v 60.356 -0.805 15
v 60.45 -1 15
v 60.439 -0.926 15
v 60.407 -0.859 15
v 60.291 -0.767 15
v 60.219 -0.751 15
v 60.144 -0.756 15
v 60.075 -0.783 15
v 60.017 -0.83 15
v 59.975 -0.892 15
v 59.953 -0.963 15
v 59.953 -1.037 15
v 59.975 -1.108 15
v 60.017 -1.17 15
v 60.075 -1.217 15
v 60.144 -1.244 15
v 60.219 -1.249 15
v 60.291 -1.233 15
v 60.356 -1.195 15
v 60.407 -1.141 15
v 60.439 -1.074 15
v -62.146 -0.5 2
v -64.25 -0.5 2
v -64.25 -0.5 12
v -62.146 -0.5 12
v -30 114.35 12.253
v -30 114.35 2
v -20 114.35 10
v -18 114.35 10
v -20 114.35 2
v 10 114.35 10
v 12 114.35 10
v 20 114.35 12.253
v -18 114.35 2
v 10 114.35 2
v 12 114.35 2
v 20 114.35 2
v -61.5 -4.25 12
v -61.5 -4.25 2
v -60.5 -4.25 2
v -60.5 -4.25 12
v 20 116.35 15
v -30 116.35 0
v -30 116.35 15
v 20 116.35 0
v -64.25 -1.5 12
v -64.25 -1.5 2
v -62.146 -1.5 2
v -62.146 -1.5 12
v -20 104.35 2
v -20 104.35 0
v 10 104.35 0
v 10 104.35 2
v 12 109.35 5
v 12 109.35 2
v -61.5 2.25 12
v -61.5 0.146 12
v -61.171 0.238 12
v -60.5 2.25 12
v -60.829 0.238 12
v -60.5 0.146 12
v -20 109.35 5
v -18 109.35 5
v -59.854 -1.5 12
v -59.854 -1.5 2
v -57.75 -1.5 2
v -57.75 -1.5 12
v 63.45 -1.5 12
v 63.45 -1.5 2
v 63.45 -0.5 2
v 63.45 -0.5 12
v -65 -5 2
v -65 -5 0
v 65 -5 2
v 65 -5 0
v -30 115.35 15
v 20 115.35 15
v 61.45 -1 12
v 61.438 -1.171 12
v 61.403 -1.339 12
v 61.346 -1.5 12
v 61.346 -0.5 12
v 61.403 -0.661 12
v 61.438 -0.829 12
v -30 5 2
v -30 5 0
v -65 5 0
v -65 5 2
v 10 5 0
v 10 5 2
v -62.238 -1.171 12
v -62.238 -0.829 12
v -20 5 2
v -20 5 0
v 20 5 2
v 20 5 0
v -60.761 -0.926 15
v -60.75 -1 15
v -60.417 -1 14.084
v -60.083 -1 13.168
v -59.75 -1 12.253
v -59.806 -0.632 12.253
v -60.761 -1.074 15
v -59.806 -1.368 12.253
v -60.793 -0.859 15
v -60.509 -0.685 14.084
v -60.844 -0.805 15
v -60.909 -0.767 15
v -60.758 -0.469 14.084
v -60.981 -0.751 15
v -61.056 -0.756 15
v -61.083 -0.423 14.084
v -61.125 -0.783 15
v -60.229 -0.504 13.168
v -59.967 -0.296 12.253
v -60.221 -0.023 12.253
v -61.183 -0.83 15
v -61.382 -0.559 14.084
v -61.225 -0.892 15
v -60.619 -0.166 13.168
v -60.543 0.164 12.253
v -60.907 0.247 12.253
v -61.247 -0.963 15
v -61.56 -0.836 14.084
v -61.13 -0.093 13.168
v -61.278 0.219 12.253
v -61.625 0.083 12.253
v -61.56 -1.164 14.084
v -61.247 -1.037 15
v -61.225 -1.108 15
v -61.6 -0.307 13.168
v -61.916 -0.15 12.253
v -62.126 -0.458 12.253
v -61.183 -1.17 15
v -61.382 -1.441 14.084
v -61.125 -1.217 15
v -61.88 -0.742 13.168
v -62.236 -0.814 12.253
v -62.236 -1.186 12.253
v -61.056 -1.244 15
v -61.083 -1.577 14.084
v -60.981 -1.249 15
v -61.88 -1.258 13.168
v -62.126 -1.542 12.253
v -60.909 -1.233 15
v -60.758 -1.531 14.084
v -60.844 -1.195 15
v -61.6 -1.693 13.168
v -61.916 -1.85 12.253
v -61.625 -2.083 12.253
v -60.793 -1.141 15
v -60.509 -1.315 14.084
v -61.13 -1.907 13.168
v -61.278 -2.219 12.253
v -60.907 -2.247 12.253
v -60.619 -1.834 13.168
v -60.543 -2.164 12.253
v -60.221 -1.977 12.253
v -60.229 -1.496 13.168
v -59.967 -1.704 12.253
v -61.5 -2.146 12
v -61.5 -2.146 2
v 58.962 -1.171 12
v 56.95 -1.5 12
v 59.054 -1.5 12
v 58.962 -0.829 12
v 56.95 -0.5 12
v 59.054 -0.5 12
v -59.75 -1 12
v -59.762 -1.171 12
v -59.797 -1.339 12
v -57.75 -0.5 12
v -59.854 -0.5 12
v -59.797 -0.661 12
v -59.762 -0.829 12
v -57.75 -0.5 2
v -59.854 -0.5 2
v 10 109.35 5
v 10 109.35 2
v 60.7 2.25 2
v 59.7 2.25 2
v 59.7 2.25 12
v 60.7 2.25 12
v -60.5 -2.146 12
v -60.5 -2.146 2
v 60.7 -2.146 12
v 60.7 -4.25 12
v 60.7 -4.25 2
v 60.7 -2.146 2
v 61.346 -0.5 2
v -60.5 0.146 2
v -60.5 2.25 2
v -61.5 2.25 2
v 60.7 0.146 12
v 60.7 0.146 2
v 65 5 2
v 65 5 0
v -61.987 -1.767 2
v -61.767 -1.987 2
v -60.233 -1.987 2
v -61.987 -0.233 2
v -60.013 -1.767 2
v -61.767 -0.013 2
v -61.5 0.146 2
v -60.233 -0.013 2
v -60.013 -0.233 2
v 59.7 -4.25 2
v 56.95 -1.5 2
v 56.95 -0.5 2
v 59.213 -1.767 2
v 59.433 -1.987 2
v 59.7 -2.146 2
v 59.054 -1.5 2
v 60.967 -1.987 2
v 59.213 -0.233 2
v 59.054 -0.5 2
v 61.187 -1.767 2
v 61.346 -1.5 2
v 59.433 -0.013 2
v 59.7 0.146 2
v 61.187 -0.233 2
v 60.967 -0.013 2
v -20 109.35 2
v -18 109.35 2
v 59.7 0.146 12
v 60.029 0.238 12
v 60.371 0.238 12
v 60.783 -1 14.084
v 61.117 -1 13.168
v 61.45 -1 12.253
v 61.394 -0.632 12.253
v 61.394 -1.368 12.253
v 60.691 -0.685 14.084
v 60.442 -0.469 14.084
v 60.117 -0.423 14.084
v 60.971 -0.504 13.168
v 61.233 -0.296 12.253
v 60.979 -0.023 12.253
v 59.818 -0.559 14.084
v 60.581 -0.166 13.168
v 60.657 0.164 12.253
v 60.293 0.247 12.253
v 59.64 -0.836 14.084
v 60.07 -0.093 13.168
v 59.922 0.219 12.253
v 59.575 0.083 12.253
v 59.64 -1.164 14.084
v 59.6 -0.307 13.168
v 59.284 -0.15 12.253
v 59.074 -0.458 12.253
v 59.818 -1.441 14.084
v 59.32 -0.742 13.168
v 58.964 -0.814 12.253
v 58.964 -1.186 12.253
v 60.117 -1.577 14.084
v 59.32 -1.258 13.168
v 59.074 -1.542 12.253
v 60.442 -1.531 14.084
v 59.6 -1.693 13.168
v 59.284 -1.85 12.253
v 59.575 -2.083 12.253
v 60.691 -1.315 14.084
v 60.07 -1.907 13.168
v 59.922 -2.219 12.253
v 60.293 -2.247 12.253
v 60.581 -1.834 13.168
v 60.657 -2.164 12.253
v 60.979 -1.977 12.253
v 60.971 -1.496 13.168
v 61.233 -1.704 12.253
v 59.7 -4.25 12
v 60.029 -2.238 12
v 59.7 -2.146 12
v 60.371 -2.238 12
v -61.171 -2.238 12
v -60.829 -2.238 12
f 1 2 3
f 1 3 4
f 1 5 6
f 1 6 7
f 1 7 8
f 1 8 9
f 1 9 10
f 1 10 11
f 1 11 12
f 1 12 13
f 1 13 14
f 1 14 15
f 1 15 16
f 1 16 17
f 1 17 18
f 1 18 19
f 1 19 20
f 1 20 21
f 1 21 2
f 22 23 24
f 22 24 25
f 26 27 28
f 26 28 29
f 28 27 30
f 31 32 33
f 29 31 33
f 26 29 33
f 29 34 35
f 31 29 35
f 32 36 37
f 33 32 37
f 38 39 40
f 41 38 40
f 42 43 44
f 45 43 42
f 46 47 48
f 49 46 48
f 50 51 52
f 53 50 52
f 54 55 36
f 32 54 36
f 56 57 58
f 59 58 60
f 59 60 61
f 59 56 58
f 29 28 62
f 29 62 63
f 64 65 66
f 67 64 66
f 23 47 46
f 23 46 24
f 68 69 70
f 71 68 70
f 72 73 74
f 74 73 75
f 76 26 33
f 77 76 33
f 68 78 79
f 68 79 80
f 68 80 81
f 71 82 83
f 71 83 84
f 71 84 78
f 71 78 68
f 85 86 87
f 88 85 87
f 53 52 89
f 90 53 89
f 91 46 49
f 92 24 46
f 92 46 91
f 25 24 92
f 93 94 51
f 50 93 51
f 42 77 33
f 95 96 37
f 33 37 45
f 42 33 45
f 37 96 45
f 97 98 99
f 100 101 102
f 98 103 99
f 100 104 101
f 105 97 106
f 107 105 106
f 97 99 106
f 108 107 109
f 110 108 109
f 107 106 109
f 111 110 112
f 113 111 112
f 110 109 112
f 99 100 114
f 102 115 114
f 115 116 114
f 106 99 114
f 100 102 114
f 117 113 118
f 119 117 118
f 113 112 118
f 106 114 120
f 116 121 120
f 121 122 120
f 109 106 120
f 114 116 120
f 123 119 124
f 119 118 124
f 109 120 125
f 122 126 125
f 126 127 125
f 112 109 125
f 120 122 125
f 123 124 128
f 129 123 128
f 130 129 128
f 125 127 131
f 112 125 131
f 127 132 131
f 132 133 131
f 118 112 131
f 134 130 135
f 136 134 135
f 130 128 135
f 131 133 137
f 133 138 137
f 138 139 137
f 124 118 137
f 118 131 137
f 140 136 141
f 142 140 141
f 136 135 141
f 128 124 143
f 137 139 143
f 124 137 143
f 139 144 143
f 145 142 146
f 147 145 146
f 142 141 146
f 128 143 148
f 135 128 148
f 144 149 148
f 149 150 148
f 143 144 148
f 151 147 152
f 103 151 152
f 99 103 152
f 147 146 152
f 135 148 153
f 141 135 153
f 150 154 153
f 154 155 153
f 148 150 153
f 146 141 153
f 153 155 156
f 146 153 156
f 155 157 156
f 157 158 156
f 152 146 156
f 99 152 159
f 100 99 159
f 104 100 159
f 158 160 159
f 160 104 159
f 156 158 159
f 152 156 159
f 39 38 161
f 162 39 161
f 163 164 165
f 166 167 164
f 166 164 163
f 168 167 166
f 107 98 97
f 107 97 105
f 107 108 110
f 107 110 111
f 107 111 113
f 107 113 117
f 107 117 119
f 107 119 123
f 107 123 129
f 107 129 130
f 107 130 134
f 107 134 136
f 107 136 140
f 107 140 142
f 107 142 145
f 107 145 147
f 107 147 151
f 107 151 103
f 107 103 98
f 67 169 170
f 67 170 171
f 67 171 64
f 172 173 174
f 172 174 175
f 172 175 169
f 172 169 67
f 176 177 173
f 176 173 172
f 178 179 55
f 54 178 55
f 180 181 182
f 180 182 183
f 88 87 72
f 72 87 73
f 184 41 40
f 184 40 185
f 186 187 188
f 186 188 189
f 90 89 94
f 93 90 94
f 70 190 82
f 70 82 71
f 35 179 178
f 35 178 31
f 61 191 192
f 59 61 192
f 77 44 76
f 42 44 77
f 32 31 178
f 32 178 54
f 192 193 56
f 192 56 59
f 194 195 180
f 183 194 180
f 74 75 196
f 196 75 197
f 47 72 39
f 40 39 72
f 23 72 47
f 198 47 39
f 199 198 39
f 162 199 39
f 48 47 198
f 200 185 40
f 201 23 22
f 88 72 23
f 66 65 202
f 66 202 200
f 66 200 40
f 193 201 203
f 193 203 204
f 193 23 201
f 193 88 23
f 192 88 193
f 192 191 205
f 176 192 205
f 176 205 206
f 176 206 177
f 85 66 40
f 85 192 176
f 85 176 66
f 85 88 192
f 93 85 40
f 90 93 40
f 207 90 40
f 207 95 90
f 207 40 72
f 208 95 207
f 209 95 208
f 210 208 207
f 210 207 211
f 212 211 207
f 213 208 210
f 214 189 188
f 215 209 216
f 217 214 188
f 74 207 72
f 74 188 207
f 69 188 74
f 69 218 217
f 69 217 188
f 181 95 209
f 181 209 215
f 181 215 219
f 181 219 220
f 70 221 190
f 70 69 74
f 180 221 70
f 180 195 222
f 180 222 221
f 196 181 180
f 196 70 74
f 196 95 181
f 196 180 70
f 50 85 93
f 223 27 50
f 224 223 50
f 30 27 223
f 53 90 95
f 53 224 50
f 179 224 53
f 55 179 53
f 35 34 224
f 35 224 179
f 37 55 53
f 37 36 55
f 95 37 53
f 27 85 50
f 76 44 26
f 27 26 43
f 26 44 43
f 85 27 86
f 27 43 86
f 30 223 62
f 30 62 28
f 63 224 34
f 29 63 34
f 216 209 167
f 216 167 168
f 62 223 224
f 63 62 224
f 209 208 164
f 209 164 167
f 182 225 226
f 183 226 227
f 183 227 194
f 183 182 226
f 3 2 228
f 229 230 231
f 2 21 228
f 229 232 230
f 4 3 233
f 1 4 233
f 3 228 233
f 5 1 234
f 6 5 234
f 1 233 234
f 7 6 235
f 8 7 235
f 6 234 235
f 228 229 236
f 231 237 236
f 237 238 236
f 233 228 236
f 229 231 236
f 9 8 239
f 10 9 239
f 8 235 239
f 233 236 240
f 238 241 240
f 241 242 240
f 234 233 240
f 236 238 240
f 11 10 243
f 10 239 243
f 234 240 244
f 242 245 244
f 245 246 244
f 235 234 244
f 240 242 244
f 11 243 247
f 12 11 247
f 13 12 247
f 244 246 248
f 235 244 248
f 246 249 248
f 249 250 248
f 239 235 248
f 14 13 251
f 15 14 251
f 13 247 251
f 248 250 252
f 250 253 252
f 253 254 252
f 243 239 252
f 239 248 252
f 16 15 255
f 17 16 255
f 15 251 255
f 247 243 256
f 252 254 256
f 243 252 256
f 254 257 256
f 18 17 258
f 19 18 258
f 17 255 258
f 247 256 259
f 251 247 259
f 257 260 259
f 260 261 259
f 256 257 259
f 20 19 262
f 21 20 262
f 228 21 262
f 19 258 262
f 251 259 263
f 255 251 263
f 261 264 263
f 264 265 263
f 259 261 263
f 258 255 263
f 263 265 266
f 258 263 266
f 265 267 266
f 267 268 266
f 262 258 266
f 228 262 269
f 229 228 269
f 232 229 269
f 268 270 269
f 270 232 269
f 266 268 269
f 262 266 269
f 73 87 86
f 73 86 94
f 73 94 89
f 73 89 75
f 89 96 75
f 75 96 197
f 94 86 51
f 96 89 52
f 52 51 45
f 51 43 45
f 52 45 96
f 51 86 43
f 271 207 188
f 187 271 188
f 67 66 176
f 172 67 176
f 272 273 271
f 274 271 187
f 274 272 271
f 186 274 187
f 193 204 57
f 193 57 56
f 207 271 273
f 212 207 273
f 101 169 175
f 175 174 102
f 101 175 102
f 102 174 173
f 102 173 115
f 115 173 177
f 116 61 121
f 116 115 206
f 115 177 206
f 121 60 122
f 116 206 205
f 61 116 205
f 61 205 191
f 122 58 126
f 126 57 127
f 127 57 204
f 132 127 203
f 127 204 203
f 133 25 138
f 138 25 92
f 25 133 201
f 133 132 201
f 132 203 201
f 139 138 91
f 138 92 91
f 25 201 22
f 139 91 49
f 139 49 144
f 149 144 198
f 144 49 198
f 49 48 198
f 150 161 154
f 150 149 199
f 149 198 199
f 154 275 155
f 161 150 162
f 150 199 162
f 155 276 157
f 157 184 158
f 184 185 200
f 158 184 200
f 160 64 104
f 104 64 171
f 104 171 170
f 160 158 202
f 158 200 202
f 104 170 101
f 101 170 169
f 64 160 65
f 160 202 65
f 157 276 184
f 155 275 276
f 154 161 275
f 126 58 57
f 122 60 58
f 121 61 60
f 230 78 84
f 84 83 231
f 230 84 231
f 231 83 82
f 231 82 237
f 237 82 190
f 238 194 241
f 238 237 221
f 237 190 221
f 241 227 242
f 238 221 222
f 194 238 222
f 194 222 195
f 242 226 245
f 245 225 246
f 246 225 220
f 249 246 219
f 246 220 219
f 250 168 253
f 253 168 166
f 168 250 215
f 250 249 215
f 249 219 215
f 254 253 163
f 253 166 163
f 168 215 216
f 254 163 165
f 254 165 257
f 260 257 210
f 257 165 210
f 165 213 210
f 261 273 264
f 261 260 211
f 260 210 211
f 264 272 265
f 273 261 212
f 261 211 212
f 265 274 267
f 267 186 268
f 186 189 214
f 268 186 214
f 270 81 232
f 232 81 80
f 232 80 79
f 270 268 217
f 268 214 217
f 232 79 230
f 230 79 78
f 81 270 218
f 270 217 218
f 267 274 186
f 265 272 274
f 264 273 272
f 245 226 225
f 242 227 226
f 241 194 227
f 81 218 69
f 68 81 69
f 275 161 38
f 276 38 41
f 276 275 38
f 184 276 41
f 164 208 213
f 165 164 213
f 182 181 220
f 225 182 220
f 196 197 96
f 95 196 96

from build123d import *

# Parameters (mm, degrees)
F0_R       = 1.25
F1_DEPTH   = 2
F0_W       = 50
F0_H       = 2
F2_DEPTH   = 15
F3_SIZE2   = 2.7474774195
F3_SIZE    = 1
F3_2_SIZE2 = 2.7474774195
F3_2_SIZE  = 1
F3_3_SIZE2 = 2.7474774195
F3_3_SIZE  = 1
F4_W       = 2.75
F4_H       = 1
F4_W_2     = 1
F4_H_2     = 2.75
F5_DEPTH   = 10
F6_W       = 2
F6_H       = 5
F7_DEPTH   = 8
F8_SIZE    = 4.99999


# Not quite as in the source:
# - a fillet or chamfer is up to 0.001 mm smaller than in the source, because OpenCascade refuses the exact size
# - a feature names something its author has since deleted; it is built from what else it names


with BuildPart() as f1:
    # F0 (on Top) → F1 (new body)
    with BuildSketch(Plane.XY):
        Polygon((-30, 5), (-65, 5), (-65, -5), (65, -5), (65, 5), (20, 5), (10, 5), (-20, 5), align=None)
        with Locations((-61, -1)):
            Circle(F0_R, mode=Mode.SUBTRACT)
        with Locations((60.2, -1)):
            Circle(F0_R, mode=Mode.SUBTRACT)
        with Locations((-61, -1)):
            Circle(F0_R)
        with Locations((60.2, -1)):
            Circle(F0_R)
        Polygon((-30, 114.35), (-30, 5), (-20, 5), (-20, 104.35), (10, 104.35), (10, 5), (20, 5), (20, 114.35), align=None)
    extrude(amount=F1_DEPTH)

    # F0 (on Top) → F2 (join)
    with BuildSketch(Plane.XY):
        with Locations((60.2, -1)):
            Circle(F0_R)
        with Locations((-61, -1)):
            Circle(F0_R)
        with Locations((-5, 115.35)):
            Rectangle(F0_W, F0_H)
    extrude(amount=F2_DEPTH)

    # F3
    f3_edges = [f1.edges().sort_by_distance(p)[0] for p in [
        (58.95, -1, 15),
    ]]
    f3_side = f1.faces().sort_by_distance((60.2, -1, 15))[0]
    chamfer(f3_edges, length=F3_SIZE, length2=F3_SIZE2, reference=f3_side)

    # F3#2
    f3_2_edges = [f1.edges().sort_by_distance(p)[0] for p in [
        (-62.25, -1, 15),
    ]]
    f3_2_side = f1.faces().sort_by_distance((-61, -1, 15))[0]
    chamfer(f3_2_edges, length=F3_2_SIZE, length2=F3_2_SIZE2, reference=f3_2_side)

    # F3#3
    f3_3_edges = [f1.edges().sort_by_distance(p)[0] for p in [
        (-5, 114.35, 15),
    ]]
    f3_3_side = f1.faces().sort_by_distance((-5, 115.35, 15))[0]
    chamfer(f3_3_edges, length=F3_3_SIZE, length2=F3_3_SIZE2, reference=f3_3_side)

    # F4 (on face) → F5 (join)
    with BuildSketch(Plane.XY.offset(2)):
        with Locations((-62.875, -1)):
            Rectangle(F4_W, F4_H)
        with Locations((-61, 0.875)):
            Rectangle(F4_W_2, F4_H_2)
        with Locations((-61, -1)):
            Rectangle(F4_W_2, F4_H)
        with Locations((-59.125, -1)):
            Rectangle(F4_W, F4_H)
        with Locations((-61, -2.875)):
            Rectangle(F4_W_2, F4_H_2)
        with Locations((60.2, 0.875)):
            Rectangle(F4_W_2, F4_H_2)
        with Locations((60.2, -1)):
            Rectangle(F4_W_2, F4_H)
        with Locations((58.325, -1)):
            Rectangle(F4_W, F4_H)
        with Locations((62.075, -1)):
            Rectangle(F4_W, F4_H)
        with Locations((60.2, -2.875)):
            Rectangle(F4_W_2, F4_H_2)
    extrude(amount=F5_DEPTH)

    # F6 (on face) → F7 (join)
    with BuildSketch(Plane.XY.offset(2)):
        with Locations((-19, 111.85)):
            Rectangle(F6_W, F6_H)
        with Locations((11, 111.85)):
            Rectangle(F6_W, F6_H)
    extrude(amount=F7_DEPTH)

    # F8 (size 5 in the source; OpenCascade refuses exactly that, so slightly less here)
    f8_edges = [f1.edges().sort_by_distance(p)[0] for p in [
        (-19, 109.35, 10),
        (11, 109.35, 10),
    ]]
    chamfer(f8_edges, length=F8_SIZE)


solid = f1.part
